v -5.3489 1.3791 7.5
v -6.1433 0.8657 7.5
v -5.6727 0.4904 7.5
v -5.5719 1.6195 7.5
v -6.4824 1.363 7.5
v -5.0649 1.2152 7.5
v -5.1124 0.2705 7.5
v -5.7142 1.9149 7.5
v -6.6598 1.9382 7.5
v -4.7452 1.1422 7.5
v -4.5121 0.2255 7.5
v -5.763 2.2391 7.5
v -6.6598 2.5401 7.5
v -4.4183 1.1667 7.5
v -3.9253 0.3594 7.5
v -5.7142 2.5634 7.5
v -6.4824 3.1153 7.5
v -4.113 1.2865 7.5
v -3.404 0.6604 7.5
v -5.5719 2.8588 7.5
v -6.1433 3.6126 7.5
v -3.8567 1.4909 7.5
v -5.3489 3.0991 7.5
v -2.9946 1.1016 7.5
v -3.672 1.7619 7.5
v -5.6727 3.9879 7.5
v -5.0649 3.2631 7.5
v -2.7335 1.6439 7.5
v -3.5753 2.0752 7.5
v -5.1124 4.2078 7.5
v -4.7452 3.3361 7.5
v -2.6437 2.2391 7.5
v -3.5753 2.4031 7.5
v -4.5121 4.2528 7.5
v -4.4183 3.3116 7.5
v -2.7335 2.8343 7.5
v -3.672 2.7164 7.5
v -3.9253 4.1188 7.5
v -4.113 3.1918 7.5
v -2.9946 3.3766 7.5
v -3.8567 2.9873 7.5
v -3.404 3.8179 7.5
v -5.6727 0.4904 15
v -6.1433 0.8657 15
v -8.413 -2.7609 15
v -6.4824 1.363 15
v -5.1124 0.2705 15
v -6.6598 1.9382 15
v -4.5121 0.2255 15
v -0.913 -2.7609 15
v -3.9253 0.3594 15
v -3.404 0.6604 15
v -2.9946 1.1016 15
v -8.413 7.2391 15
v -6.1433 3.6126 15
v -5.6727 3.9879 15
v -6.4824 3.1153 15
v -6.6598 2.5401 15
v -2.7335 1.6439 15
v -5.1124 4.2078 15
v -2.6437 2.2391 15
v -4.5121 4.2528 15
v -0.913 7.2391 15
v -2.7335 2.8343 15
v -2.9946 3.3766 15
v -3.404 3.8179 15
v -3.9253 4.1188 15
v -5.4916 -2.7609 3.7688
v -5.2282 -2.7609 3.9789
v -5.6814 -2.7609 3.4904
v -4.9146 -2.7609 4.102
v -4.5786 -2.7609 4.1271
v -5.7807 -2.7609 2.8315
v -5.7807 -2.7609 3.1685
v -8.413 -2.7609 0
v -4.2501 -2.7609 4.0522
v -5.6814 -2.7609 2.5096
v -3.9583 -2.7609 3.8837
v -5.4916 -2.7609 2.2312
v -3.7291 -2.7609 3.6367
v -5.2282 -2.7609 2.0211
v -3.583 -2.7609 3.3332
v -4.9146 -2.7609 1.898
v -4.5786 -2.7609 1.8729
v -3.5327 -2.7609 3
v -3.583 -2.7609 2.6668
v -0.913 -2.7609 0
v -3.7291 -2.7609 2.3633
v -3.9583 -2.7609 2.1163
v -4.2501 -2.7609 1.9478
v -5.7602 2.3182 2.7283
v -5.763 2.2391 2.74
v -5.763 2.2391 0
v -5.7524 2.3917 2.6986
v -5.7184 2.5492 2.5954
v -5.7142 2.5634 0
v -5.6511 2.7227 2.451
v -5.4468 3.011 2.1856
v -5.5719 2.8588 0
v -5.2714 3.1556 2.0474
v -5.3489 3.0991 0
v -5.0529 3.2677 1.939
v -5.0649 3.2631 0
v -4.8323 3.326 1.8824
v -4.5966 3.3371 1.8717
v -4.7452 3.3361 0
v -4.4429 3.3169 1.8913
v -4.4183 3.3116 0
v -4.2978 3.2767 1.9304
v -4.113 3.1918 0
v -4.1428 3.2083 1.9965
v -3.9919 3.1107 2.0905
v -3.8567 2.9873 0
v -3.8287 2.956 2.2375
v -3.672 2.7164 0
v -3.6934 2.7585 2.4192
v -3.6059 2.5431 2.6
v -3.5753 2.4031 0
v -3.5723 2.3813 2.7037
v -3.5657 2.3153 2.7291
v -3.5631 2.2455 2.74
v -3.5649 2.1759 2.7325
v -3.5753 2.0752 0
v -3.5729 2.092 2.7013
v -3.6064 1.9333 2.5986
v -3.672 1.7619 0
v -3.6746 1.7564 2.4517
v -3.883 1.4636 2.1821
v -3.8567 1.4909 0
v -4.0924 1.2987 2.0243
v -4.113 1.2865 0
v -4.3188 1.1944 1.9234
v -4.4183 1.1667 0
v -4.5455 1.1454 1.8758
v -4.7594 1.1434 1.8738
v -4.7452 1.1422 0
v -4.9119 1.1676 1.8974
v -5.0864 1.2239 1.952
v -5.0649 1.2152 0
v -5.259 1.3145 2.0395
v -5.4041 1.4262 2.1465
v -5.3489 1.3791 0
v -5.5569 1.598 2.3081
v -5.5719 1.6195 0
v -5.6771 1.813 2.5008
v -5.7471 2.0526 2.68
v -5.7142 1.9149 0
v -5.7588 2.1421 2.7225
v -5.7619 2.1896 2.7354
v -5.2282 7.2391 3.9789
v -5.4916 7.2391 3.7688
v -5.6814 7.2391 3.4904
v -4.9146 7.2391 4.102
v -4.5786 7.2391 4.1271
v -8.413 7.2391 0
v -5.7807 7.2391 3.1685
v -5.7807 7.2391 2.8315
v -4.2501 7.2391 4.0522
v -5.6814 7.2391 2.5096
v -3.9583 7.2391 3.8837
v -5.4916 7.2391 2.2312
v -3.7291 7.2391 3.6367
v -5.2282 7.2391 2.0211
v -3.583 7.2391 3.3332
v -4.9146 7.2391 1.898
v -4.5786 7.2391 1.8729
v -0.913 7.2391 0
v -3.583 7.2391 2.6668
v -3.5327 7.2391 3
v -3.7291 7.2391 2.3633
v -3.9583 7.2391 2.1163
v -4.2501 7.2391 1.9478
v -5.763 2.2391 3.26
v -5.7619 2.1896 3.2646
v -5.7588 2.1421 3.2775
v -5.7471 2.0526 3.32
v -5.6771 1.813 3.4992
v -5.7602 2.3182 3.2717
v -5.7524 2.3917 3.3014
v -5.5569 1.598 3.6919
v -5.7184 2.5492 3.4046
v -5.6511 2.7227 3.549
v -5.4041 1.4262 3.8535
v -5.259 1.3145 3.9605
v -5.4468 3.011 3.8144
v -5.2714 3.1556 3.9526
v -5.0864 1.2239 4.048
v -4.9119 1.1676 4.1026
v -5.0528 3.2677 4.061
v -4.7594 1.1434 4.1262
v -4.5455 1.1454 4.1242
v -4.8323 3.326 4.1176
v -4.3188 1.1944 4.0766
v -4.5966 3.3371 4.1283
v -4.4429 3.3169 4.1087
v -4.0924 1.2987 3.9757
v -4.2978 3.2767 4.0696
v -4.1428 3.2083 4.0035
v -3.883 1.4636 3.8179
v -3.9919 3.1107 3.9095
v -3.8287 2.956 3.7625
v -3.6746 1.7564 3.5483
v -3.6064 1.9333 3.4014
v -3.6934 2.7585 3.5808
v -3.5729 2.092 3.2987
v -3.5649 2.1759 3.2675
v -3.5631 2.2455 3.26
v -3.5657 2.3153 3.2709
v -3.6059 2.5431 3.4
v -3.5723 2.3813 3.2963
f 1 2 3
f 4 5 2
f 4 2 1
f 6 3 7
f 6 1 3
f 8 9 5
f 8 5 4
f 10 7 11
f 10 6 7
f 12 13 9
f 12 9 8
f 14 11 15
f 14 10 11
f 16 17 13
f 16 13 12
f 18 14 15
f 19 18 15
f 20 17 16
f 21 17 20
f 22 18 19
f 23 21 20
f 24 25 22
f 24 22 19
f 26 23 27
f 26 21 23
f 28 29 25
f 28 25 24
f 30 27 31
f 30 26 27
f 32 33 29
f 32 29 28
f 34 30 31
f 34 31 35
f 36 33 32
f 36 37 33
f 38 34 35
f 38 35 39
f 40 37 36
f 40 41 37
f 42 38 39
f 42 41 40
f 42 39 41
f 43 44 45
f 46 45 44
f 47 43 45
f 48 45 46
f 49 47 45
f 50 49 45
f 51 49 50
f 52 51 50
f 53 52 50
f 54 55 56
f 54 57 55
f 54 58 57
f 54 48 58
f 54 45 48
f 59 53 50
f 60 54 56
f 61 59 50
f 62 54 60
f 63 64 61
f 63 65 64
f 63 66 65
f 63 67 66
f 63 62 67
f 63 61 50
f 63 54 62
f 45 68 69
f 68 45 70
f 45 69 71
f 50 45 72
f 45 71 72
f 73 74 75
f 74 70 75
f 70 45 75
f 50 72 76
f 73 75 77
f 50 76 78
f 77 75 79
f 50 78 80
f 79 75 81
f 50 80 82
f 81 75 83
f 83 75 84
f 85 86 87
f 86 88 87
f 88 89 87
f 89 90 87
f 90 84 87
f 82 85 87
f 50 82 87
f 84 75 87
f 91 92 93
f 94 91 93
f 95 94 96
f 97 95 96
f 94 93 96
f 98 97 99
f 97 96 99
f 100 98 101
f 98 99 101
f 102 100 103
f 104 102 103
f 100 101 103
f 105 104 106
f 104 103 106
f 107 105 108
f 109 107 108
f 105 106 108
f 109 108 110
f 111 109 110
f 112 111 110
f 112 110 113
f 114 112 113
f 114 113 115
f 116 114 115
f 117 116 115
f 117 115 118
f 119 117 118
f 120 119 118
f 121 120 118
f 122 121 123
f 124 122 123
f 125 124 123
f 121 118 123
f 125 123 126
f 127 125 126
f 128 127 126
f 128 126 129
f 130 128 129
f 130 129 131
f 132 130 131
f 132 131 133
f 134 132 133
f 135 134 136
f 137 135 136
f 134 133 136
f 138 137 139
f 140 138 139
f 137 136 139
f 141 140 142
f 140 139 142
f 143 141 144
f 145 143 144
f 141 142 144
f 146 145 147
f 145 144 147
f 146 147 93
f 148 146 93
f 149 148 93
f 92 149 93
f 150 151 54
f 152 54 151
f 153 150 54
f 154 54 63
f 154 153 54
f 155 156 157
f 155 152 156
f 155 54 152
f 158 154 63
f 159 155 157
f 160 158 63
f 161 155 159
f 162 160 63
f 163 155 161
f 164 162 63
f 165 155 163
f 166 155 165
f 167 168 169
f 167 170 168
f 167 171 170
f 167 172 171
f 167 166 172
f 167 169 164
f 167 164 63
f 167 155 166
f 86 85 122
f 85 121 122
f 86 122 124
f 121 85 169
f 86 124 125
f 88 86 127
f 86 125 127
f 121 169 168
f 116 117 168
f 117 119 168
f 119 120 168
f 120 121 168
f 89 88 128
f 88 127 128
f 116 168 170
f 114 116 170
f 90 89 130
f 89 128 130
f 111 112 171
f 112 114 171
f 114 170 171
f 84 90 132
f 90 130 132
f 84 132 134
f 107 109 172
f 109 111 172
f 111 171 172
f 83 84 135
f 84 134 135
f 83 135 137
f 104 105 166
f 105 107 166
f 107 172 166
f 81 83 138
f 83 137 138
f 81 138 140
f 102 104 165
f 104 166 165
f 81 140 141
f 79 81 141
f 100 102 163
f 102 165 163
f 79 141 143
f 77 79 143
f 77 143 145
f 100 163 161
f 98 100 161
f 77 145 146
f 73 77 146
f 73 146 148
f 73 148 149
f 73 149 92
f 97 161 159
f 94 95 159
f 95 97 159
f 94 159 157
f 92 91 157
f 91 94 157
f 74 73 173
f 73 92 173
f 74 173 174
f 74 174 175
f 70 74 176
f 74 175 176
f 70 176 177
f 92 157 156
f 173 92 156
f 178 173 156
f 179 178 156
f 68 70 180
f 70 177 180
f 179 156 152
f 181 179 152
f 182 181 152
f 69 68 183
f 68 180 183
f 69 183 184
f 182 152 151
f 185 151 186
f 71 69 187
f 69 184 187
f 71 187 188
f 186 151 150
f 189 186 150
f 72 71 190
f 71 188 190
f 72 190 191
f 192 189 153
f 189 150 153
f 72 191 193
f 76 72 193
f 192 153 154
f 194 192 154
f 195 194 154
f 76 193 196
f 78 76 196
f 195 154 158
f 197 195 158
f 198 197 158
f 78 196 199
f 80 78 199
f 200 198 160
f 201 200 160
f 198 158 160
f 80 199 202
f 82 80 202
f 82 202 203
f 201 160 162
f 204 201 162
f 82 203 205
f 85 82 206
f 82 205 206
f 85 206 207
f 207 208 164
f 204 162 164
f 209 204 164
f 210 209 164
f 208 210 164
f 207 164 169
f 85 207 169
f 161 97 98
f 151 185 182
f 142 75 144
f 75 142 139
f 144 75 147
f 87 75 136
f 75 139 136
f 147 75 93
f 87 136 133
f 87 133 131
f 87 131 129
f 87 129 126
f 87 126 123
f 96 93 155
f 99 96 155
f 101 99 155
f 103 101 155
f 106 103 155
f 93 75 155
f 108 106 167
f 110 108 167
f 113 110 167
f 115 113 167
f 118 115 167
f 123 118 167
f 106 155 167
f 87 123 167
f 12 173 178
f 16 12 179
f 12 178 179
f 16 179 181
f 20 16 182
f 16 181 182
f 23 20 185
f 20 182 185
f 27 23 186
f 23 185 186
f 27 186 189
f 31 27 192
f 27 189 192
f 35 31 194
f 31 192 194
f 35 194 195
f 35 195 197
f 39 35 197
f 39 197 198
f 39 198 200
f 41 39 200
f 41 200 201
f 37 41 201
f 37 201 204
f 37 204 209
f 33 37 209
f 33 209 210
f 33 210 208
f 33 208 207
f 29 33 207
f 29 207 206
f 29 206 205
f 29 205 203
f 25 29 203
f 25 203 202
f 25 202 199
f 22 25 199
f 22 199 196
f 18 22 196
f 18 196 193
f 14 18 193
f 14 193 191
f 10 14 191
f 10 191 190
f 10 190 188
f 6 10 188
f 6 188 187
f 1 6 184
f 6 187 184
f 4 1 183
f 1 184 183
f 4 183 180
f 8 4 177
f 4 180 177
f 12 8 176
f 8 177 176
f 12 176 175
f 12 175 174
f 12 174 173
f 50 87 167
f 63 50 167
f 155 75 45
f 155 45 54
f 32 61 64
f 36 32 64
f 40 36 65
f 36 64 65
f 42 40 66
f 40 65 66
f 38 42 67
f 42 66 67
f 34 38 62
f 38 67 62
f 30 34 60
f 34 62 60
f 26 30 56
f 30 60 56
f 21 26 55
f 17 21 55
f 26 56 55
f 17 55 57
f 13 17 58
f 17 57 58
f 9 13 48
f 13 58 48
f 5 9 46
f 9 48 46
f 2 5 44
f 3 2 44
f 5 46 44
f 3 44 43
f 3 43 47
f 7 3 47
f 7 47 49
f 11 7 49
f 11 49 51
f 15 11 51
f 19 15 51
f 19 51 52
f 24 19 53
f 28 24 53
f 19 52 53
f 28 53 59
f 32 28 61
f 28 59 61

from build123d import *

# Parameters (mm, degrees)
SKETCH1_W                     = 7.5
SKETCH1_H                     = 10
BOSS_EXTRUDE1_DEPTH           = 15
HOLE_FOR_TUBING_R             = 1.1
CUT_EXTRUDE1_DEPTH            = 16
F_10_32_HOLE_FOR_LUER_SCREW_R = 2.0193
CUT_EXTRUDE2_DEPTH            = 7.5
F_4_40_SET_SCREW_HOLE_R       = 1.1303
CUT_EXTRUDE3_DEPTH            = 11


with BuildPart() as part:
    # Sketch1 → Boss-Extrude1 (new body)
    with BuildSketch(Plane.XY):
        with Locations((-4.663043478, 2.239130435)):
            Rectangle(SKETCH1_W, SKETCH1_H)
    extrude(amount=BOSS_EXTRUDE1_DEPTH)

    # hole for tubing → Cut-Extrude1 (cut, through all)
    with BuildSketch(Plane(origin=(0, 0, 0), x_dir=(-1, 0, 0), z_dir=(0, 0, -1))):
        with Locations((4.663043478, 2.239130435)):
            Circle(HOLE_FOR_TUBING_R)
    extrude(amount=-CUT_EXTRUDE1_DEPTH, mode=Mode.SUBTRACT)

    # 10-32 hole for luer screw → Cut-Extrude2 (cut)
    with BuildSketch(Plane.XY.offset(15)):
        with Locations((-4.663043478, 2.239130435)):
            Circle(F_10_32_HOLE_FOR_LUER_SCREW_R)
    extrude(amount=-CUT_EXTRUDE2_DEPTH, mode=Mode.SUBTRACT)

    # 4-40 set screw hole → Cut-Extrude3 (cut, through all)
    with BuildSketch(Plane(origin=(0, 7.239130435, 0), x_dir=(1, 0, 0), z_dir=(0, 1, 0))):
        with Locations((-4.663043478, -3)):
            Circle(F_4_40_SET_SCREW_HOLE_R)
    extrude(amount=-CUT_EXTRUDE3_DEPTH, mode=Mode.SUBTRACT)


solid = part.part
